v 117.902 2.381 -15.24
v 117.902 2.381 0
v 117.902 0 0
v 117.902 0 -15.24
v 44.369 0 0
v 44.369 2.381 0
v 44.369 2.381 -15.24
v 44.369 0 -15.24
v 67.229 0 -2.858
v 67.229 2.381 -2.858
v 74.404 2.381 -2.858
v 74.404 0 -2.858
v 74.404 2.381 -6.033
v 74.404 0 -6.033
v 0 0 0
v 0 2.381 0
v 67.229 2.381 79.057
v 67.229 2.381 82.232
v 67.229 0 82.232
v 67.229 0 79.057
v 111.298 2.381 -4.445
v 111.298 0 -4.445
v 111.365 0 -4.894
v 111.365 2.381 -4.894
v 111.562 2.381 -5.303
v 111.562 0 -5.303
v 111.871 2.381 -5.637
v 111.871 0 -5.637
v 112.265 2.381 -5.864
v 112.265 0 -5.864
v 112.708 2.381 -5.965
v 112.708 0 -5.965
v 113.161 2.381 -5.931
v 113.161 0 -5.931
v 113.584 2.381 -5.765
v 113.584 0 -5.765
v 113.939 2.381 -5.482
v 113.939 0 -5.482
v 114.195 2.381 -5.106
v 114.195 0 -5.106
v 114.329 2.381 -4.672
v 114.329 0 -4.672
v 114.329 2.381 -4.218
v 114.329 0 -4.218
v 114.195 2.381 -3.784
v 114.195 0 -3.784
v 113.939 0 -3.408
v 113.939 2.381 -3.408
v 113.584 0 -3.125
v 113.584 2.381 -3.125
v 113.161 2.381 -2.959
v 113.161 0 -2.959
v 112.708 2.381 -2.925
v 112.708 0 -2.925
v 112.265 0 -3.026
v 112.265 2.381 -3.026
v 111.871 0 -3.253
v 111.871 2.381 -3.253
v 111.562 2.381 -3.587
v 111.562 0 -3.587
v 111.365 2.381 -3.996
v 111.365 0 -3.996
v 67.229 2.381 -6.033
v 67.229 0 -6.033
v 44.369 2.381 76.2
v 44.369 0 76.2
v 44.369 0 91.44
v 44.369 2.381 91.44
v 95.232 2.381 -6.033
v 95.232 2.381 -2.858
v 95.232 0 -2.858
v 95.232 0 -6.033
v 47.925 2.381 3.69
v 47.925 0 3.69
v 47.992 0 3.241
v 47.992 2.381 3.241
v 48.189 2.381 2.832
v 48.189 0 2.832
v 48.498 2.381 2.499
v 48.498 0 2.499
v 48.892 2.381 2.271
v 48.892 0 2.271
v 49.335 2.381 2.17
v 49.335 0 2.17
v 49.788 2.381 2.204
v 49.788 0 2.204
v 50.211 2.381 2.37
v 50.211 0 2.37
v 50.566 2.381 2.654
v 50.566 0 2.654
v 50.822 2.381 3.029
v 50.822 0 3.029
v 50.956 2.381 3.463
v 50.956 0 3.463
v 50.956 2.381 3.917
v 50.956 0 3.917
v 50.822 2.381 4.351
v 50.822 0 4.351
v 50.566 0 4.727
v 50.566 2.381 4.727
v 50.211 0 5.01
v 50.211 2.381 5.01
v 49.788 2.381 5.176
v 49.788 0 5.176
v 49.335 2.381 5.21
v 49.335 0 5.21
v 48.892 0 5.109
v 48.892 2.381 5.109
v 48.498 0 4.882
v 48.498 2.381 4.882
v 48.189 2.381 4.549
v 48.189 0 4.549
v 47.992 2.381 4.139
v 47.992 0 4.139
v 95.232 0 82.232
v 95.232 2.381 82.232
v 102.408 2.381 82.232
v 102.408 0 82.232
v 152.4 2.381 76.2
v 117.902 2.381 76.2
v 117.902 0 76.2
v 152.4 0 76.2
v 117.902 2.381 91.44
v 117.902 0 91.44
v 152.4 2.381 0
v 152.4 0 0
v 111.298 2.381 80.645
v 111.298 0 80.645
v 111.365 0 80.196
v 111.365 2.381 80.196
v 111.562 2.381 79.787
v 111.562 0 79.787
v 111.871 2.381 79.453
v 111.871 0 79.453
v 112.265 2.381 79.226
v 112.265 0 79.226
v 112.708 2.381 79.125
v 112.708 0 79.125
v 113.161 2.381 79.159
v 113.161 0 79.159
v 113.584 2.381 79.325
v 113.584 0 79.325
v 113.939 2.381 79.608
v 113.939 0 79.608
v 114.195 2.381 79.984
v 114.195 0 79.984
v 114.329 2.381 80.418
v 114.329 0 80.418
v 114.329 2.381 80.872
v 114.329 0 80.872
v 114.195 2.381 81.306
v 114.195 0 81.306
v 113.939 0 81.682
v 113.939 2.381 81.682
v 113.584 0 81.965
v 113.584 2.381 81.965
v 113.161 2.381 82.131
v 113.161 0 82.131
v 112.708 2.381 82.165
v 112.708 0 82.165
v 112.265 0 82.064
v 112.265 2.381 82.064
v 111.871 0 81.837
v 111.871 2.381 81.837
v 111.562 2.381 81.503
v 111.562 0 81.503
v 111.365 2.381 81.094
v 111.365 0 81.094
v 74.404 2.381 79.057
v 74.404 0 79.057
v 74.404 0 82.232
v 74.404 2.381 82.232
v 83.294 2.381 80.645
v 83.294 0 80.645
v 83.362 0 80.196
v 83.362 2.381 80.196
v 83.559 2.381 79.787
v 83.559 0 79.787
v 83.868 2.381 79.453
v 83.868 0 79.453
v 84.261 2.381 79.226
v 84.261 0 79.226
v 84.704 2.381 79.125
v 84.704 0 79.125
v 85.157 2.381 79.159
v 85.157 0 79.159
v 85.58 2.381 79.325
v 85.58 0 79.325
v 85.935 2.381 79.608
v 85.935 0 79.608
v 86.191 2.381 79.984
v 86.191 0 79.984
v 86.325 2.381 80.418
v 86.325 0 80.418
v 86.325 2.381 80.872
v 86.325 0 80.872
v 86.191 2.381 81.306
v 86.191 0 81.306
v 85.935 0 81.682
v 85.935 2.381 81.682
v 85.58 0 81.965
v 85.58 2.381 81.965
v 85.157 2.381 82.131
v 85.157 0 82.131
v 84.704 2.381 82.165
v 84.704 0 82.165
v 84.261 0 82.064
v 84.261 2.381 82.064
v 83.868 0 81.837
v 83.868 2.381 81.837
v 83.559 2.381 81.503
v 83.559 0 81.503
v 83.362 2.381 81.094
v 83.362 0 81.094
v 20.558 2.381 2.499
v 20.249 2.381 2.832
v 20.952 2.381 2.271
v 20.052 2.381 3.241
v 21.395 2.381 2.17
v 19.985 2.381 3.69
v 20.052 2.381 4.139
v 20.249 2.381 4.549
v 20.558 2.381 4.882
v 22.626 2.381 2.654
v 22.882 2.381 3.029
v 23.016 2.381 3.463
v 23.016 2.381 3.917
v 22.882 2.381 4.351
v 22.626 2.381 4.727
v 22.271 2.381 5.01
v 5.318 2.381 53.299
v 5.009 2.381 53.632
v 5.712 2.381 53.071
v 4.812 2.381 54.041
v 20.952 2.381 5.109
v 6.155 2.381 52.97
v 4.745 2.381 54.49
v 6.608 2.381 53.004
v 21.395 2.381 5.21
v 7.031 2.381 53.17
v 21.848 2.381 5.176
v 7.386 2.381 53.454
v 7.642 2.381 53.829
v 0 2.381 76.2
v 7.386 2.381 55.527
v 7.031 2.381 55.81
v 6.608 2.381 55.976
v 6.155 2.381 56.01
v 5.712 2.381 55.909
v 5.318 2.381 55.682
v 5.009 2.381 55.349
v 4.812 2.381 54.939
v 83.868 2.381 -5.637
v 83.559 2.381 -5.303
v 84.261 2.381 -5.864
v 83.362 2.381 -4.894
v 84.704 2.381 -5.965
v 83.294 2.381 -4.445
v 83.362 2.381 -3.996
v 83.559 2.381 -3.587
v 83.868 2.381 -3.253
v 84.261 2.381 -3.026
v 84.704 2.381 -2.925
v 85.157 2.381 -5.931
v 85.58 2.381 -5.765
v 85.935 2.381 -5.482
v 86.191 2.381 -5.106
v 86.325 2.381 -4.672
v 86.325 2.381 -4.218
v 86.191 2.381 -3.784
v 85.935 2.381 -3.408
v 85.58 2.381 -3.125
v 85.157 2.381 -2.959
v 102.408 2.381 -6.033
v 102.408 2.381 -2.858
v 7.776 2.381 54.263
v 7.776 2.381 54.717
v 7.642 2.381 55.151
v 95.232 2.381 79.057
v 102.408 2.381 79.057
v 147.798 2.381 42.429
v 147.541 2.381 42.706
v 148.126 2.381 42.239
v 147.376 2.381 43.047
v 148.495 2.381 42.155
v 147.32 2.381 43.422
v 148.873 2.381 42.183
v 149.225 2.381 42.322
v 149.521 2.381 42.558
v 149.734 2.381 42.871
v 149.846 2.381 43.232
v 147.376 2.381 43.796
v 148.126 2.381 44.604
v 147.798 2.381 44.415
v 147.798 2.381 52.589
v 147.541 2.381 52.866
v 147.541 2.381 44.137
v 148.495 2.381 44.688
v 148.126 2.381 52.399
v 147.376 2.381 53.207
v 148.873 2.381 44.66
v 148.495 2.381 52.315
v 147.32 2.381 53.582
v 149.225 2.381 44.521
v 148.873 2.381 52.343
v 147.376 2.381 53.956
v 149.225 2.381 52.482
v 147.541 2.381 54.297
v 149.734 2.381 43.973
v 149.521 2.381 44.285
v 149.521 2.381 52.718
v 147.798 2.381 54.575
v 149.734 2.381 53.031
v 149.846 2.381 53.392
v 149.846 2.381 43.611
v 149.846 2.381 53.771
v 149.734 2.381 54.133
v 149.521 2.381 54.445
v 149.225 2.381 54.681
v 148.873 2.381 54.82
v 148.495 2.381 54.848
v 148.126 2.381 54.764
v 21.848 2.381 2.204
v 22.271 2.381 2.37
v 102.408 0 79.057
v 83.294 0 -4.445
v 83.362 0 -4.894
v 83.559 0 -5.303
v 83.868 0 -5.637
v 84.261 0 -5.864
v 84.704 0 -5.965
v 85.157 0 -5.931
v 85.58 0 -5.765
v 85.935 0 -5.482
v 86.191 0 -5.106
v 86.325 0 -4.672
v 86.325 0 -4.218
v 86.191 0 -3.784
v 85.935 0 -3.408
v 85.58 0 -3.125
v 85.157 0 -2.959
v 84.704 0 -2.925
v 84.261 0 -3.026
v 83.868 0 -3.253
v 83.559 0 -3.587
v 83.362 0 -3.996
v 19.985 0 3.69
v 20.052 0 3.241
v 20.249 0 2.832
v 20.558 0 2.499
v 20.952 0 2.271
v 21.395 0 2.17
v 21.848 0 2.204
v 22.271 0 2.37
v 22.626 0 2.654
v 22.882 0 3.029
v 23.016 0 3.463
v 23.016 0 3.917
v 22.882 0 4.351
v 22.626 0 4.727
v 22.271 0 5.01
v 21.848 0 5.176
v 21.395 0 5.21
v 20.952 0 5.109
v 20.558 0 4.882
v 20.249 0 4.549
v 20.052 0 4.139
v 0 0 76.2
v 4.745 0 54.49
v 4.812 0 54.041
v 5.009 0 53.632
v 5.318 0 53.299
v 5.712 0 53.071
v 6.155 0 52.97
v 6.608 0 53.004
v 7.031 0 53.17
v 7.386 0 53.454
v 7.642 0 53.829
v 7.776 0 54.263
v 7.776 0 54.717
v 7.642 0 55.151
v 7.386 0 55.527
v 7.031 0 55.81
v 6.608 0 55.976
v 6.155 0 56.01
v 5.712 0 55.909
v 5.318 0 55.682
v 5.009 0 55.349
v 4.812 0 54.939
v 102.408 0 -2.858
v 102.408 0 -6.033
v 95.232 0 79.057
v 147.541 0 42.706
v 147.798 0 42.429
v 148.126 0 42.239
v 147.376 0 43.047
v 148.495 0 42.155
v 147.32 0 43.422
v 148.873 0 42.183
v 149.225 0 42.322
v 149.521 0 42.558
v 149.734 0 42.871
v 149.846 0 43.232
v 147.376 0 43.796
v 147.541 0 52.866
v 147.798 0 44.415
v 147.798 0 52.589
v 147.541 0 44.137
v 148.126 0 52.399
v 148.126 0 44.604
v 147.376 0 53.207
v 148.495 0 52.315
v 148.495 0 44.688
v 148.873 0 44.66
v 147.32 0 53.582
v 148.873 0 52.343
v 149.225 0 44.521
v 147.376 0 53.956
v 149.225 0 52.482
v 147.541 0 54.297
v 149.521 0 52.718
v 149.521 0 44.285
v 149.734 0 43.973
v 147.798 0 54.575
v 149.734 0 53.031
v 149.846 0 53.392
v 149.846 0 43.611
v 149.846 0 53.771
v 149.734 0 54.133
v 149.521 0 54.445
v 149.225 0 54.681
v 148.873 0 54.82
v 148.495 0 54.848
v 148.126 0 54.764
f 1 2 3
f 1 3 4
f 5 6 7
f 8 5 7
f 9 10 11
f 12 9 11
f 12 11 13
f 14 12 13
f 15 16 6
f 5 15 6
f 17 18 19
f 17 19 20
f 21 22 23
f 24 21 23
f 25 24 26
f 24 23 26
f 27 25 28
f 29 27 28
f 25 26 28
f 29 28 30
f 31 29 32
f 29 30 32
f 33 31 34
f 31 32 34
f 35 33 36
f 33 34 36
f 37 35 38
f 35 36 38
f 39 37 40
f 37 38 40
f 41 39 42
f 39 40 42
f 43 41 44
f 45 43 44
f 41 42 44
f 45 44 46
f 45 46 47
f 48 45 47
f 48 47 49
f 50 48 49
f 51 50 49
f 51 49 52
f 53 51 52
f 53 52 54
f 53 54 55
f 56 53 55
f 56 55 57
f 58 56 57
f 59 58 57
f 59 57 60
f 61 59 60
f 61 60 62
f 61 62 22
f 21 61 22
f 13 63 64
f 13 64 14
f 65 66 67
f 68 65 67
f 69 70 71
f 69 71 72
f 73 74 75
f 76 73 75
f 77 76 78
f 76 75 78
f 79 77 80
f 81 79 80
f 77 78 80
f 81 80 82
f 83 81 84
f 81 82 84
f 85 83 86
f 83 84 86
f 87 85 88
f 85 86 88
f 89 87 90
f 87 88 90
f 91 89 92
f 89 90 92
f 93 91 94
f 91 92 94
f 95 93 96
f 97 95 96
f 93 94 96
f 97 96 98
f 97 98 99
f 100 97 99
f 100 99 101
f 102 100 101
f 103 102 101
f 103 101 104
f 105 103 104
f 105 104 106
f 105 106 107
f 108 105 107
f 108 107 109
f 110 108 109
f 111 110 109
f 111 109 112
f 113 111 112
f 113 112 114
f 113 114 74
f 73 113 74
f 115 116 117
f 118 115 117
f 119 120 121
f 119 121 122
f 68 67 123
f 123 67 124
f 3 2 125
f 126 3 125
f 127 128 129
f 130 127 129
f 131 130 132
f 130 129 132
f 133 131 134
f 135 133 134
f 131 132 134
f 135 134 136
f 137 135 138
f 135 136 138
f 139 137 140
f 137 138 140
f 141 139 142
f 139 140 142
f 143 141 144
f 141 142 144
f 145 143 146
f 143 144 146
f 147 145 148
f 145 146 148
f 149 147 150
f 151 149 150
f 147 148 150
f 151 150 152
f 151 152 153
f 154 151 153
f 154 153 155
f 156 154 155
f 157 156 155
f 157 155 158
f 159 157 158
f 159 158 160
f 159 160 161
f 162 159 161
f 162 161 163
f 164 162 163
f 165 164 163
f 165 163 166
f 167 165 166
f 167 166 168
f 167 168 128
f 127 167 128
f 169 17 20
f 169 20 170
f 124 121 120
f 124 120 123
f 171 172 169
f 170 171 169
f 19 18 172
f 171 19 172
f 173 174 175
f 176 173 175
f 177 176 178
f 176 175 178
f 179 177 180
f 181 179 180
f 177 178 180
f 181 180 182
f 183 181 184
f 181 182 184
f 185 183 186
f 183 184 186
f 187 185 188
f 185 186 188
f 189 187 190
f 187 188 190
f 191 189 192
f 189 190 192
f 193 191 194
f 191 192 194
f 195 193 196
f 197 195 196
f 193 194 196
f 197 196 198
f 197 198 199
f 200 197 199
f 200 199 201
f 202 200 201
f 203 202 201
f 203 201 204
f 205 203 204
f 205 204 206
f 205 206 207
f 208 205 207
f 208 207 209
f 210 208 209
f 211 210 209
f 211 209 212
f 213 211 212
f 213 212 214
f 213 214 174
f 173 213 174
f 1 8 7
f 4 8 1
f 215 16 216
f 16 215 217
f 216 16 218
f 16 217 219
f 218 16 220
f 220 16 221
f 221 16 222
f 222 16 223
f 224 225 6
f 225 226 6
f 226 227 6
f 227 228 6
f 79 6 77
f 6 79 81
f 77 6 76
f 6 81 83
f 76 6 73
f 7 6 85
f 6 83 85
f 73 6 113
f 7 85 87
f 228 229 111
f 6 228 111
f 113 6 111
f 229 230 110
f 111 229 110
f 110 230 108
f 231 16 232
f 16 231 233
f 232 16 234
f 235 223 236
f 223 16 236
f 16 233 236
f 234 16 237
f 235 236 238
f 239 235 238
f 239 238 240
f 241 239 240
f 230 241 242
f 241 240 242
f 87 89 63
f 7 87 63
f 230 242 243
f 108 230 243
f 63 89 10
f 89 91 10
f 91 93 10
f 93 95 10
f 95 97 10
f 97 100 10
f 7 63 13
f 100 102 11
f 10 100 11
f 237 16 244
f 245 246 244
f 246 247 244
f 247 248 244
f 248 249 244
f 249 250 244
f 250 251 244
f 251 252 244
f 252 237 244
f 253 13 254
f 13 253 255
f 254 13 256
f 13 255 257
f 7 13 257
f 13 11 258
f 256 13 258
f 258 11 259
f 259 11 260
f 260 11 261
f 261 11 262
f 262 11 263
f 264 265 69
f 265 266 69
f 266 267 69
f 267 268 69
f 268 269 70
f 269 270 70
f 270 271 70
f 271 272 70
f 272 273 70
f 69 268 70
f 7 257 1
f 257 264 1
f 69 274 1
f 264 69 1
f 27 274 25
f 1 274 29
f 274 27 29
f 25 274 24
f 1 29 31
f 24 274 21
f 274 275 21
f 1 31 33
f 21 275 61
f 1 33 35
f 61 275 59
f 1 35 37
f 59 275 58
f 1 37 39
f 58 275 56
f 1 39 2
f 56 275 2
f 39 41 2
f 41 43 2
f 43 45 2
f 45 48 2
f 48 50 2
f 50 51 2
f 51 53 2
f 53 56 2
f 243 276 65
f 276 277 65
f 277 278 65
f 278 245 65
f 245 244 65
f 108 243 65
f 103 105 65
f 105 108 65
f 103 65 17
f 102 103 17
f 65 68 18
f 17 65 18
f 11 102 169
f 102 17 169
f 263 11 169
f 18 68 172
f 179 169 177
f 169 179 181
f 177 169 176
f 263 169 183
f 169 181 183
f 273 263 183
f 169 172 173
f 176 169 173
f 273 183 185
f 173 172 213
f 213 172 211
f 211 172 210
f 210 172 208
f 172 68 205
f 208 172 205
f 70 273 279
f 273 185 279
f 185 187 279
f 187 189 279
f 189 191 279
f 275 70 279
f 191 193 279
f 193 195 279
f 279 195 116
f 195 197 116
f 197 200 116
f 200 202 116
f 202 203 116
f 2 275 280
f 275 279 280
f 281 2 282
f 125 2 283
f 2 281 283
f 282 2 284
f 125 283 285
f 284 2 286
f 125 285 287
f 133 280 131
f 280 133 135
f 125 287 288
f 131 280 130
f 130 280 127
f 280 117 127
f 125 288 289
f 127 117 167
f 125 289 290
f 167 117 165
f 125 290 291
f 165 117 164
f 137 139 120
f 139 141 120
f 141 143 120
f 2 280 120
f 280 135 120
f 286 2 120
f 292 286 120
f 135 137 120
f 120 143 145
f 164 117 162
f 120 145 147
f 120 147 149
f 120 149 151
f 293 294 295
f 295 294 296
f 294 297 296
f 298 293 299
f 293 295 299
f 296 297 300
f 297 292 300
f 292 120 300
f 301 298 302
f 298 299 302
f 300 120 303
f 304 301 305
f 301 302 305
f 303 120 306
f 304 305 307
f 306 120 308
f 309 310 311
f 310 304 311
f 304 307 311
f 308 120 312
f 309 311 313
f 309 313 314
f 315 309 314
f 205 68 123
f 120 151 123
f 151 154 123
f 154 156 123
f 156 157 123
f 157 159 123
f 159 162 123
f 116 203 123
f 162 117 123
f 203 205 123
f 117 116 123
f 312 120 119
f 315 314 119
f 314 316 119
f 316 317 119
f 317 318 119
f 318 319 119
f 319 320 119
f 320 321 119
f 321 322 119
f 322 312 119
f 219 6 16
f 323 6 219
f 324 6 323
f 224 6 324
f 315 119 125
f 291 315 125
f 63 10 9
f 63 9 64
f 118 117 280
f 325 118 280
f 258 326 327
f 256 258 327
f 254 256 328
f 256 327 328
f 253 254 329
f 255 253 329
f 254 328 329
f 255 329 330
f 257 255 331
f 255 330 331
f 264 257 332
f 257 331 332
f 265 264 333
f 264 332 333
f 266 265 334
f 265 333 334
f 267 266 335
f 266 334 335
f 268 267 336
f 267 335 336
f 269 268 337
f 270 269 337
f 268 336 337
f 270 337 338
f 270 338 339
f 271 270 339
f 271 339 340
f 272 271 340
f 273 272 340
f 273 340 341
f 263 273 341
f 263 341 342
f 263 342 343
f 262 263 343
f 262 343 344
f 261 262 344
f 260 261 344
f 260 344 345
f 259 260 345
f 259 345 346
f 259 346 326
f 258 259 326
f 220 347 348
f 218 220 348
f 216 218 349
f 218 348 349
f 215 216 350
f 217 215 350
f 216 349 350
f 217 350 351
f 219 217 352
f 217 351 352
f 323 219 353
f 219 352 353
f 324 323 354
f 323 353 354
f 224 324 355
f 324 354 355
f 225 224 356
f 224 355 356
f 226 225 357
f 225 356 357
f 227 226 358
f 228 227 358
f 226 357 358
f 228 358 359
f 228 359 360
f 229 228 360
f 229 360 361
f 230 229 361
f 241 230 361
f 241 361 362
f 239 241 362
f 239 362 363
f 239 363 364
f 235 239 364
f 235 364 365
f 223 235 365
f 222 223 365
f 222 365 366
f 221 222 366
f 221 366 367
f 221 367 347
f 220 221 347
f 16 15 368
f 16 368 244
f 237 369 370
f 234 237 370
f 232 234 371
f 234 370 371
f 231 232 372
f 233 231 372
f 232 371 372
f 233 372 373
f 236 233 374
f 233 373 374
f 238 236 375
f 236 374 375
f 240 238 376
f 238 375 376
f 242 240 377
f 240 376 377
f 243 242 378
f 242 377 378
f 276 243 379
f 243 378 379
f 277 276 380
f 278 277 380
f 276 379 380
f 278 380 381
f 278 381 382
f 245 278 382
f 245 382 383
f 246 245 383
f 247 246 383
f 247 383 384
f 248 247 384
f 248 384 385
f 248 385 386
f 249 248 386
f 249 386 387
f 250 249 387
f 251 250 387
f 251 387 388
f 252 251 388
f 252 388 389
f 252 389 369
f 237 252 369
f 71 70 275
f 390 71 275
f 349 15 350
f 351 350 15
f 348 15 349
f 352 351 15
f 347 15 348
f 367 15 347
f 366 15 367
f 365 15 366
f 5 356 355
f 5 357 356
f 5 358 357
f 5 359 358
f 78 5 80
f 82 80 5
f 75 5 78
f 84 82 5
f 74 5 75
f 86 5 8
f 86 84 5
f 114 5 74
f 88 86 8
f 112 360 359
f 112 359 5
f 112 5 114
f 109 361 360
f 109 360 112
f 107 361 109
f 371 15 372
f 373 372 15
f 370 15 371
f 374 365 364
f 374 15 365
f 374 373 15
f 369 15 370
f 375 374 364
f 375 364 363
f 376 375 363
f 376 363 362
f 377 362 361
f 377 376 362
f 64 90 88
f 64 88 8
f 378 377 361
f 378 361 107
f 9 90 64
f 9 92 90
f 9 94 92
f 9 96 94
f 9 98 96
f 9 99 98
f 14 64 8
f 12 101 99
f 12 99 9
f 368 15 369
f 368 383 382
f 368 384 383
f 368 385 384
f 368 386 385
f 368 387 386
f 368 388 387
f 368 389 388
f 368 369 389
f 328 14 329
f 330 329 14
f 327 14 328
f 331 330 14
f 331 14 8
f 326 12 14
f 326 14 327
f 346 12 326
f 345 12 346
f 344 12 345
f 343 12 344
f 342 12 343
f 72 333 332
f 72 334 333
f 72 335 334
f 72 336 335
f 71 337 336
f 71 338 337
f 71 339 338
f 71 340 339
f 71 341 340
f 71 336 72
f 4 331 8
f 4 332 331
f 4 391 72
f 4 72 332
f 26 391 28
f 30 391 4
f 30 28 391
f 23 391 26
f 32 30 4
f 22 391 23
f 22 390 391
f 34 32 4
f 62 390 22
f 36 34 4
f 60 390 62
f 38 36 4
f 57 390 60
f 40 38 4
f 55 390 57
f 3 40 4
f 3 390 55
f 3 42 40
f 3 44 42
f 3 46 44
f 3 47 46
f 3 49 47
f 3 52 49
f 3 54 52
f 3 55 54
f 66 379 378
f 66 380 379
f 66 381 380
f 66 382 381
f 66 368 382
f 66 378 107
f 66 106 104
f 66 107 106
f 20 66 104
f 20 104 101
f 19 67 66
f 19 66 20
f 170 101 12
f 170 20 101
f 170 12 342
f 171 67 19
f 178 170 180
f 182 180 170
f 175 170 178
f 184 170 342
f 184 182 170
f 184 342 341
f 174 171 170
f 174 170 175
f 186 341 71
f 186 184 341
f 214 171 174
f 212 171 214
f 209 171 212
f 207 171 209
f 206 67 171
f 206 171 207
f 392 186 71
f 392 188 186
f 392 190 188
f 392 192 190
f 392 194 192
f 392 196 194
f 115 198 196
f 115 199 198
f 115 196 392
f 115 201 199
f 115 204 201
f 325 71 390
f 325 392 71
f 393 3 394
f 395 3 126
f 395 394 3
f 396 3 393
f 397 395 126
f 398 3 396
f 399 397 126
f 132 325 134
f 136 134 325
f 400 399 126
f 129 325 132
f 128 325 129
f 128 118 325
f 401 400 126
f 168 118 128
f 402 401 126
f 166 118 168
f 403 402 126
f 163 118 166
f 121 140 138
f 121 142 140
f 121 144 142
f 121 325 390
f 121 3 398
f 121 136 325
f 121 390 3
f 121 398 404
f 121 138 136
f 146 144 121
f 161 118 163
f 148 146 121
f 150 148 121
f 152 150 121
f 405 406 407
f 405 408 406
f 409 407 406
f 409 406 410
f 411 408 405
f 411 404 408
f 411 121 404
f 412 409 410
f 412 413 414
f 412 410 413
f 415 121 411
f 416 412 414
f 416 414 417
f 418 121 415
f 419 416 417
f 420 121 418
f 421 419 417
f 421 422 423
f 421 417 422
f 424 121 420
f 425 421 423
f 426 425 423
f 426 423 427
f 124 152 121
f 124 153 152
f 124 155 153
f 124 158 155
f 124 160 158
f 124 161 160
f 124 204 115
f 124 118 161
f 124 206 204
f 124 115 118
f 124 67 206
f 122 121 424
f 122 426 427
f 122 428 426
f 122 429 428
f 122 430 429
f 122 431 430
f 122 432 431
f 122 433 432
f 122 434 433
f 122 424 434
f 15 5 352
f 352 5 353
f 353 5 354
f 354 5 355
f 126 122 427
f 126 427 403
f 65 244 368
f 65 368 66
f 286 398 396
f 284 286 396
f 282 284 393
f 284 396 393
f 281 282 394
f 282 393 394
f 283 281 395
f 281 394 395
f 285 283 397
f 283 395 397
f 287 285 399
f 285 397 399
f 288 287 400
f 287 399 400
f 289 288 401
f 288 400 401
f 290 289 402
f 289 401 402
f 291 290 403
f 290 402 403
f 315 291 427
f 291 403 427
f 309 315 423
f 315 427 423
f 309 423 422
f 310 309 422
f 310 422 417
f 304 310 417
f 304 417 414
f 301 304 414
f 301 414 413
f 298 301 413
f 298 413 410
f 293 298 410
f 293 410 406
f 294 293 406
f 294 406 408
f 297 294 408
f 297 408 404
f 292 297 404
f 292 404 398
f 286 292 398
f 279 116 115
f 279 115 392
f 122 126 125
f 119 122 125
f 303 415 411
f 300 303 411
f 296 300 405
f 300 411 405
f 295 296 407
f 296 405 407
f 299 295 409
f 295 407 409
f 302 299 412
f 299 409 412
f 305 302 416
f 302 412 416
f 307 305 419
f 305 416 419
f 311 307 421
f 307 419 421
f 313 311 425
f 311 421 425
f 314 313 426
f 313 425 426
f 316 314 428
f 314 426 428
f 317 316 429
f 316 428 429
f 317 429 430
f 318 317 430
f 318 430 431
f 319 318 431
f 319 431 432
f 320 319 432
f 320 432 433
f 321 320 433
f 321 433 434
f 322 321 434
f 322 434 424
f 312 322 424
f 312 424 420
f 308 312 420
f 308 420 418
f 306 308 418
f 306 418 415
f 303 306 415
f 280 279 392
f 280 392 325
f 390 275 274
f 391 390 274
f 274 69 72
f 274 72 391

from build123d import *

# Parameters (mm, degrees)
SKETCH1_W                  = 152.4
SKETCH1_H                  = 2.38125
BOSS_EXTRUDE1_DEPTH        = 76.2
F_31_0_12_DIAMETER_HOLE4_D = 3.048
SKETCH25_W                 = 73.533
SKETCH25_H                 = 8.89
BOSS_EXTRUDE2_DEPTH        = 2.38125
SKETCH26_W                 = 7.1755
SKETCH26_H                 = 3.175
CUT_EXTRUDE3_DEPTH         = 3.38125
F_31_0_12_DIAMETER_HOLE6_D = 3.048
SKETCH32_W                 = 73.533
SKETCH32_H                 = 6.35
BOSS_EXTRUDE3_DEPTH        = 2.38125
SKETCH31_R                 = 1.27
CUT_EXTRUDE4_DEPTH         = 3.38125


with BuildPart() as part:
    # Sketch1 → Boss-Extrude1 (new body)
    with BuildSketch(Plane.XY):
        with Locations((76.2, 1.190625)):
            Rectangle(SKETCH1_W, SKETCH1_H)
    extrude(amount=BOSS_EXTRUDE1_DEPTH)

    # #31 (0.12) Diameter Hole4 (through all)
    with Locations(Plane(origin=(0, 2.38125, 0), x_dir=(1, 0, 0), z_dir=(0, 1, 0))):
        with Locations((49.448559218, -3.690103872), (21.508561504, -3.690103872), (6.268559218, -54.490103872)):
            Hole(F_31_0_12_DIAMETER_HOLE4_D / 2)

    # Sketch25 → Boss-Extrude2 (add)
    with BuildSketch(Plane(origin=(0, 2.38125, 0), x_dir=(1, 0, 0), z_dir=(0, 1, 0))):
        with Locations((81.135059218, 4.445)):
            Rectangle(SKETCH25_W, SKETCH25_H)
        with Locations((81.135059218, -80.645)):
            Rectangle(SKETCH25_W, SKETCH25_H)
    extrude(amount=-BOSS_EXTRUDE2_DEPTH)

    # Sketch26 → Cut-Extrude3 (cut, through all)
    with BuildSketch(Plane(origin=(0, 2.38125, 0), x_dir=(1, 0, 0), z_dir=(0, 1, 0))):
        with Locations((70.816309218, 4.445)):
            Rectangle(SKETCH26_W, SKETCH26_H)
        with Locations((98.819809218, 4.445)):
            Rectangle(SKETCH26_W, SKETCH26_H)
        with Locations((98.819809218, -80.645)):
            Rectangle(SKETCH26_W, SKETCH26_H)
        with Locations((70.816309218, -80.645)):
            Rectangle(SKETCH26_W, SKETCH26_H)
    extrude(amount=-CUT_EXTRUDE3_DEPTH, mode=Mode.SUBTRACT)

    # #31 (0.12) Diameter Hole6 (through all)
    with Locations(Plane(origin=(0, 2.38125, 0), x_dir=(1, 0, 0), z_dir=(0, 1, 0))):
        with Locations((84.818059218, 4.445), (112.821559218, 4.445), (112.821559218, -80.645), (84.818059218, -80.645)):
            Hole(F_31_0_12_DIAMETER_HOLE6_D / 2)

    # Sketch32 → Boss-Extrude3 (add)
    with BuildSketch(Plane.XZ):
        with Locations((81.135059218, 88.265)):
            Rectangle(SKETCH32_W, SKETCH32_H)
        with Locations((81.135059218, -12.065)):
            Rectangle(SKETCH32_W, SKETCH32_H)
    extrude(amount=-BOSS_EXTRUDE3_DEPTH)

    # Sketch31 → Cut-Extrude4 (cut, through all)
    with BuildSketch(Plane(origin=(0, 0, 0), x_dir=(-1, 0, 0), z_dir=(0, -1, 0))):
        with Locations((-148.59, -43.421592432)):
            Circle(SKETCH31_R)
        with Locations((-148.59, -53.581592432)):
            Circle(SKETCH31_R)
    extrude(amount=-CUT_EXTRUDE4_DEPTH, mode=Mode.SUBTRACT)


solid = part.part
